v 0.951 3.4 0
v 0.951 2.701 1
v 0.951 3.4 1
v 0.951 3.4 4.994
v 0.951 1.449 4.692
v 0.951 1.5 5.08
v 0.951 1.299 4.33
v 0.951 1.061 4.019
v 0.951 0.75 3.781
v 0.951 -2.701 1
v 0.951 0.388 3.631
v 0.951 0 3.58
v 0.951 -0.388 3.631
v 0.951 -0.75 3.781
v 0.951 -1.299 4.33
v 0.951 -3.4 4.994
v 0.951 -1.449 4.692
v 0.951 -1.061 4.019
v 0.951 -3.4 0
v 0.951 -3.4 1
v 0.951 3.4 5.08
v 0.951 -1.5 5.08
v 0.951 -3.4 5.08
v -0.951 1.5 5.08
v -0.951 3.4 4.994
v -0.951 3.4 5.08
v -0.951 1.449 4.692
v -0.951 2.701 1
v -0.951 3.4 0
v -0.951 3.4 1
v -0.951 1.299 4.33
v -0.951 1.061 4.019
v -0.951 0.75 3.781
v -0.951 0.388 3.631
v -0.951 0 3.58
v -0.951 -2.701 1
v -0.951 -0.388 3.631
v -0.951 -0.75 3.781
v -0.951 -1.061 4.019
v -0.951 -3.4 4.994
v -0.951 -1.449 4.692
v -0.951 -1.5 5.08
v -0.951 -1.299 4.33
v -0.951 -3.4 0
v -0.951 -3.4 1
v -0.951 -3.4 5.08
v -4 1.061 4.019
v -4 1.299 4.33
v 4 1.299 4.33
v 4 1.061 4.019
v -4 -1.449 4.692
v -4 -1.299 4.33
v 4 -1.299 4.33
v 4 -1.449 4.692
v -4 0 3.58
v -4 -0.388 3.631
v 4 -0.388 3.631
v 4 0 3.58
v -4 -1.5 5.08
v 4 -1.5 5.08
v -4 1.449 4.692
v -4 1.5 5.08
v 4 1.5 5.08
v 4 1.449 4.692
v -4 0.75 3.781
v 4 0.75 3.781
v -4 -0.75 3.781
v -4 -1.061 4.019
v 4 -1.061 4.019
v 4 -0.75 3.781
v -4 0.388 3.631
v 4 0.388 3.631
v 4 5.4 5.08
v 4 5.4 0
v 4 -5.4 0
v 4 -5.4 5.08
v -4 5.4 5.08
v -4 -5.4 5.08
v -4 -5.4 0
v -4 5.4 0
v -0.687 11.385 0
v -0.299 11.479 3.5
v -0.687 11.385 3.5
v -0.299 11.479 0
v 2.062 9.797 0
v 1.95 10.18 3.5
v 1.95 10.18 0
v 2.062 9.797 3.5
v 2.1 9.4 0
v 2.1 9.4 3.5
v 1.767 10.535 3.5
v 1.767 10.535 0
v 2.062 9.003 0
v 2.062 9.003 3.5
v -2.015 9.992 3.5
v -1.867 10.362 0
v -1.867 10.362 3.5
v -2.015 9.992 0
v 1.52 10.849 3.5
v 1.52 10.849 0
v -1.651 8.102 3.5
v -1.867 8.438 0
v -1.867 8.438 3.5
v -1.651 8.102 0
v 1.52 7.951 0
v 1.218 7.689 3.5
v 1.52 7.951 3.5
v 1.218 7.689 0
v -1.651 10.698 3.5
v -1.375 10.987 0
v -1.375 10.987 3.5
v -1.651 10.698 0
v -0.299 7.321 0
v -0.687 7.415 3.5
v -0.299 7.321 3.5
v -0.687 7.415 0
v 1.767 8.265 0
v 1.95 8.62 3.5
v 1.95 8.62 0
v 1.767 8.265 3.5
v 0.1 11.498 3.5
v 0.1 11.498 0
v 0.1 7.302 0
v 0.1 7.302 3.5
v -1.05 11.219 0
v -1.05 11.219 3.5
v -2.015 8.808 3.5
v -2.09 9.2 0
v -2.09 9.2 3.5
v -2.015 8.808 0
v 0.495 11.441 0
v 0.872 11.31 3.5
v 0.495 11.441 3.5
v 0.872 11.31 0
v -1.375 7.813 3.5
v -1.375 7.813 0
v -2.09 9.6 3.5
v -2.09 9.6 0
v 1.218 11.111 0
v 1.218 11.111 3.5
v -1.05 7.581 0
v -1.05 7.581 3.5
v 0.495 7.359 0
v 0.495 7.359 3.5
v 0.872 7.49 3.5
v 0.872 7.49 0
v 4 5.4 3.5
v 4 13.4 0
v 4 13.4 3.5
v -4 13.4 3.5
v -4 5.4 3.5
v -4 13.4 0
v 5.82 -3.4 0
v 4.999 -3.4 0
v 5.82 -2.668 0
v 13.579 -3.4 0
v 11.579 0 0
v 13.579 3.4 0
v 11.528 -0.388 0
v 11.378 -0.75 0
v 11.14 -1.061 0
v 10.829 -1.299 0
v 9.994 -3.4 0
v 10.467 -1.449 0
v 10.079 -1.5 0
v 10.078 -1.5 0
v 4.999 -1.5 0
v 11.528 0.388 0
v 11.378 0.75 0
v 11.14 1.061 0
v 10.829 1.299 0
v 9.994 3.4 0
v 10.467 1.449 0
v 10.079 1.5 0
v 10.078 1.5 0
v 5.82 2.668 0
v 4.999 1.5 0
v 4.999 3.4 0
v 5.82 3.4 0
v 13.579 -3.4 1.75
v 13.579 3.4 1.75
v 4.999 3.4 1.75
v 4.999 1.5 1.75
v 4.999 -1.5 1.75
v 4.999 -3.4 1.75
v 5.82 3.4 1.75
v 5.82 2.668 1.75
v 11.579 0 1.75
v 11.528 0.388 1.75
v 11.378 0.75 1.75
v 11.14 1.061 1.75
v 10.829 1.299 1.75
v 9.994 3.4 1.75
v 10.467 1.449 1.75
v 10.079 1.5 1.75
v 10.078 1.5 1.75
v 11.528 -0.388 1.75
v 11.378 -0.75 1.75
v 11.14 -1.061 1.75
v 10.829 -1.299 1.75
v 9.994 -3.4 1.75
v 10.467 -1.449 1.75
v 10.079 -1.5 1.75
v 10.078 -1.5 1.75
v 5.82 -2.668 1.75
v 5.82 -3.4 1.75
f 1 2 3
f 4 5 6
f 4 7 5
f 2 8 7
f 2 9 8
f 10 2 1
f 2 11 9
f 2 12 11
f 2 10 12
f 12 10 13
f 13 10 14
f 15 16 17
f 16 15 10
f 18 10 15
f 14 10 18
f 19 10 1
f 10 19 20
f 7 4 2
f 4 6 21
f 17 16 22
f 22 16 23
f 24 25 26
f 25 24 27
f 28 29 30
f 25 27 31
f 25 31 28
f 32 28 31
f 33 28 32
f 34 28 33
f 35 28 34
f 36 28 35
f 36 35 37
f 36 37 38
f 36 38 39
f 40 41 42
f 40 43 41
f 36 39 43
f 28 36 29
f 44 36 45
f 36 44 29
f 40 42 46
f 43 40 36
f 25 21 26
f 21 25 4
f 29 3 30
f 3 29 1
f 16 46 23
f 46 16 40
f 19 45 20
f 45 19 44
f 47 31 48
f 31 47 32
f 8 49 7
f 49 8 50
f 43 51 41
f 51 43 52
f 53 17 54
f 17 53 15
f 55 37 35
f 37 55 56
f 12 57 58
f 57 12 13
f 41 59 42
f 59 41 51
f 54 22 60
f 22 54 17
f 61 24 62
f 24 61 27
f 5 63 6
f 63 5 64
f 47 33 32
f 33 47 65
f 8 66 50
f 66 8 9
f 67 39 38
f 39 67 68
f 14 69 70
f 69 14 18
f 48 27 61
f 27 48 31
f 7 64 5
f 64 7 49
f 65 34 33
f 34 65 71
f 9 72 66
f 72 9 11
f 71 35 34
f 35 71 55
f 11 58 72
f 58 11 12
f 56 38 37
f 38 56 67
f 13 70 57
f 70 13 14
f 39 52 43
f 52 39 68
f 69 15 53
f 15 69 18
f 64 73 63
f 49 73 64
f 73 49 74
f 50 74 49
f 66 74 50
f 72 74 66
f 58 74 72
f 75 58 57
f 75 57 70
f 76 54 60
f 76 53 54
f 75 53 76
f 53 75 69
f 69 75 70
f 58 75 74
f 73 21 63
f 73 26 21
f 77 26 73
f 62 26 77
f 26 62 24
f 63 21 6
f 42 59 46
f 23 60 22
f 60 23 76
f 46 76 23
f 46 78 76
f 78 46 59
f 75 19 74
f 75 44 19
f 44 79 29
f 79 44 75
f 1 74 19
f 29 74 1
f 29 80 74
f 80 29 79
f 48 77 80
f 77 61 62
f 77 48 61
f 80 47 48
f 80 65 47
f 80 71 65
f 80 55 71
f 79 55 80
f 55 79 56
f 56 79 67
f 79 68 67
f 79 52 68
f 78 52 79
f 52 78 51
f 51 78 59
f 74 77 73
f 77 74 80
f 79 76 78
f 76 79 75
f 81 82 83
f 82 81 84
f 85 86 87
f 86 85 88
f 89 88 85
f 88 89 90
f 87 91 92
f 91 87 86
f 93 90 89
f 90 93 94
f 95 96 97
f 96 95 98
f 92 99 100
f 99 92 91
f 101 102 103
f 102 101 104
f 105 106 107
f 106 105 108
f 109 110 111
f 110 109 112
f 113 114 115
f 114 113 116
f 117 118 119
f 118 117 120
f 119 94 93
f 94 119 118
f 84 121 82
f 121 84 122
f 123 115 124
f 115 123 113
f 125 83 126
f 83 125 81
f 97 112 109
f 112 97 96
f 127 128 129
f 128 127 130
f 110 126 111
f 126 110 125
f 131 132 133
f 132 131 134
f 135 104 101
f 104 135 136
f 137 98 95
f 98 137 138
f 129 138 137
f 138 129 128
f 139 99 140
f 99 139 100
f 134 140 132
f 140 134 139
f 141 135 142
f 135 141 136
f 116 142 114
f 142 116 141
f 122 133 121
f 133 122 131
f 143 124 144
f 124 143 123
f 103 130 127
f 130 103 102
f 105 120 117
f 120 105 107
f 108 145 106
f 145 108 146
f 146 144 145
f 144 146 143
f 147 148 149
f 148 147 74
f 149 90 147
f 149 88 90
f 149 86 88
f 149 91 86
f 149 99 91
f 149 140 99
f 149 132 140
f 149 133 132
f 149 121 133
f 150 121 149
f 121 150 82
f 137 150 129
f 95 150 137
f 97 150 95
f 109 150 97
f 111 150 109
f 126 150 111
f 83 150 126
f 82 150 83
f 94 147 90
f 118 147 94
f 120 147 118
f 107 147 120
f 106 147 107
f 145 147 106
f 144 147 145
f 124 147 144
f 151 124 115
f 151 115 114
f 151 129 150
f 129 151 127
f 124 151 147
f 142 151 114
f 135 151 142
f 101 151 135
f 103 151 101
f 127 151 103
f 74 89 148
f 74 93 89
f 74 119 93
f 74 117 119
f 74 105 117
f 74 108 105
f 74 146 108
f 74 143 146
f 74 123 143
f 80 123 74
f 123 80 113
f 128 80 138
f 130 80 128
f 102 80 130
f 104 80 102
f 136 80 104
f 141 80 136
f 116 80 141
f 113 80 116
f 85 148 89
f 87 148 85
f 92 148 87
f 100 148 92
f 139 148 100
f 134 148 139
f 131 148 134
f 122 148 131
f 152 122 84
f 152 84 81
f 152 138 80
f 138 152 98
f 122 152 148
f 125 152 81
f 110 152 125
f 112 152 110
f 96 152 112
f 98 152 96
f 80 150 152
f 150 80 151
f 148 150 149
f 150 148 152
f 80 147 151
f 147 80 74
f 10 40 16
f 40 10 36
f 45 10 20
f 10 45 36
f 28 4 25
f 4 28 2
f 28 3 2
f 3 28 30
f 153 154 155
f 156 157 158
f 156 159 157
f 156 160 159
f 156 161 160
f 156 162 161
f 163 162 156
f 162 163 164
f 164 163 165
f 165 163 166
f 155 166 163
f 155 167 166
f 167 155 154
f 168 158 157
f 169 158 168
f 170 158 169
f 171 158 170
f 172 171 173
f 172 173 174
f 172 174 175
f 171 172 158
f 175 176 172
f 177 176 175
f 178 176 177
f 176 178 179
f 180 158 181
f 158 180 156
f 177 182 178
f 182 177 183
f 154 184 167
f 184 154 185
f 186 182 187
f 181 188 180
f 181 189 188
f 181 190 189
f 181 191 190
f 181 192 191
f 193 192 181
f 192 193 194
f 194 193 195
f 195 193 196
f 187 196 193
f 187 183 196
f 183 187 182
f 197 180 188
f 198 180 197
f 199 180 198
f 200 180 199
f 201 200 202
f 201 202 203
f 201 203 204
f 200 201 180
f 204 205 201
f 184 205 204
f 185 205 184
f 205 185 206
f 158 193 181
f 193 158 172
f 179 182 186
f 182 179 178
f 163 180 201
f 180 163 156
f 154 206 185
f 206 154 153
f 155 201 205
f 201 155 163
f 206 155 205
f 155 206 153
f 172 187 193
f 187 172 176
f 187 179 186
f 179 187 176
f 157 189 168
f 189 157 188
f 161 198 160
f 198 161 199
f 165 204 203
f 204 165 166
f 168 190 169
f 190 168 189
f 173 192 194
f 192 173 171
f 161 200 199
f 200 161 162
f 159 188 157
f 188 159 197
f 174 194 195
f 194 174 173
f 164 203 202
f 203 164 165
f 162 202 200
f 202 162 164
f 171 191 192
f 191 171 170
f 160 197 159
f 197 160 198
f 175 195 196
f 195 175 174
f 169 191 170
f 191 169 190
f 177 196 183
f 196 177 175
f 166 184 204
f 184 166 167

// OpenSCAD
use <mylib.scad>;

f = .18;  // fudge
p = .001;
pp = 2 * p;
t0 = 1;
inch = 25.4;


// brackets to hold (cylinder) brushes under pool vacuum
br = .2 * inch; // brush radius

bw = 10; // x-width of main block
bh = 8;  // y-height of main block
z0 = 3;  // depth of vac inset
z1 = 2;  // base plate thickness
z2 = 5;  // thick parts of base (screw into here)
z3 = 3.5;  // depth of material for screw (screw len = z2 + z3)
z4 = br;  // height to brush axis
stub = bw;
sr = 1.5; // rod radius
head = 1; // z depth reserved for screw head
scr = 2.1; // screw radius 
shr = 2.3; // screw head radius

axl = 10;
module axel(l = axl, sl = stub) {
  trr([sl-l/2, 0, br, [0, -90, 0]]) 
    cylinder(h = l + 2*sl, r = sr);
}
module brush(l = axl, sl = stub) {
  trr([-sl/2, 0, br, [0, -90, 0]]) {
    cylinder(h = l, r = br);
  }
  color("white") axel(l);
}

// space for the screw, subtracted in difference below
// positioned with join between head & screw @ z=0
module screw(len = z3, head = head ) {
  trr([0, 0, -len]) cylinder(h=len+head, r = scr); // screw part
  trr([0, 0, 0]) cylinder(h = head, r = shr);
}

bt = 2;  // x-thickness of slotted brackets
tz = 1.5;  // top z (& clip top thickness)
bz = br + sr + tz; // bracket z-top

// bracket with side-sliding locking clip
module bracket1(bt = bt) {
  module caxis(r = sr) {
    trr([bw/2, 0, br-z3, [0, -90, 0]]) cylinder(h = bw+pp, r = r);
  }
  sxy = [1, .5]; // scale to shrink
  zh = z4-sr;    // depth of hole for screw head
  difference() {
    trr([0, 0, z3/2]) cube([bw, bh, z3], center = true); // base cube
    trr([0, 0, zh-head]) screw(zh);   // remove hole for screw
     clip1((rd+f)/2, .3);

  }
  trr([0, 0, z3]) 
  differenceN() 
  {
    linear_extrude(height = bz-z3, scale = sxy) 
      difference() {
        square(size = [bw-pp, bh], center = true);
        square(size = [bw-2*bt-pp, bh], center = true);
    }
    trr([0,0,0, [1, 0, 0, [bw/2, 0, br-z3]]])
      hull() {
        caxis();
        dup([0, 0, 3]) caxis(sr*.6);
     }
  }
}

rd = 1.8;
rh = 2;
module clip_rod(r = rd/2, h = rh ){
  trr([0, p, 0, [90, 0, 0]]) cylinder(h = h+pp, r = r);
}
module clip1(r = rd/2, dh = 0) {
  dx = bw/2 - rd/2 - 1;
  dz = z3/2;
  color("blue") {
    trr([dx, bh/2, dz]) clip_rod(r, rh+dh);
    trr([-dx, bh/2, dz]) clip_rod(r, rh+dh);
  }

  clipx = bw - 2*bt;
  clipy = 2;
  clipz = bz;

  trr([0, (bh+clipy)/2, clipz/2]) cube([bw, clipy, clipz], center = true);
  trr([0, (bh/2-sr)/2, bz-tz/2]) cube([clipx, bh/2+2*sr, tz], center = true);
}


cw2 = 1.9;   // x-width of clip slot
ch2 = 2*(sr+1.9); // y-height of clip

bw2 = 8;  // x-width of bracket2
bh2 = ch2+4;  // add screw block later
bz2 = br;

module screwblock2(dx = 2*shr+1) {
  dy = dx;
  dz = z3;
  trr([0, bh2/2+dy/2, dz/2]) 
  difference() {
    cube([dx, dy, dz],center = true);
    trr([0, 0, dz/2+p]) screw(z3+pp);
  }
}

// bracket with down plunging locking clip
module bracket2() {
  wedge();
  trr([0, 0, 0, [0, 0, 180]]) wedge();
  differenceN(1) {
    trr([0, 0, bz2/2]) cube([bw2, bh2, bz2], center = true);
    axel(0);
    clip2i(pp, pp);
  }
  screwblock2(bw2);
}

// wedge added to bracket2, removed from clip2
// dw: grow/shrink width of wedge
// dz: adjust the bottom of wedge
module wedge(dw = pp, dz = 0) {
  cw = cw2 + dw;
  bz = 1;      // thickness of bottom 'foot'
  x1 = z2 - bz;
  y2 = x1 * tan(atan2(.7, x1+dz));
  trr([cw/2+p, -ch2/2-p, 1, [0, -90, 0]])
  linear_extrude(height = cw + pp) 
  polygon(points = [[dz, 0], [x1, 0], [dz, y2]]);
}
// wedge();
// outer block of clip, without hole or slots
// dw: grow/shrink width of wedge
// dz: adjust height of bottom edge of wedge
module clip2i(dw = pp, dz = 0) {
  cw = cw2 + dw;
  cz = bz2 + sr + 2;  // 2 = thickness above axel
  difference() {
    trr([0, 0, cz/2-p]) cube([cw, ch2, cz], center = true);
    wedge(dw, dz);
    trr([0, 0, 0, [0,  0, 180]]) wedge(dw, dz);
  }
}

cs2 = .15; // clip2 shrinkage
module clip2() {
  cy = sr*2;
  color("blue")
  difference() {
    clip2i(-cs2, -f);  // lower bottom of wedge
    trr([0, 0, -p]) axel(0, cw2/2 + pp);
    trr([0, 0, br/2-pp]) cube([cw2, cy, br], center = true);
  }
}

// 0: design1, 1: print
// 2: design2, 3: print
loc = 3;
// 0: no brush, 1: brush
bsh = 0;

atrans(loc, [[0, 0, 0], 0])
bracket1();

atrans(loc, [[0, 0, 0], [0, 0, 0, [-90, 0, 0, [0, bh/2+2, 0]]]])
clip1();

atrans(loc, [undef, 0, [0, 0, 0], 2])
bracket2();
atrans(loc, [undef, 0, [0, 0, f/2], [bw/2, 0, (cw2-cs2)/2, [0, 90, 0]]])
clip2();


atrans(bsh, [undef, [0, 0, 0]]) 
brush();
